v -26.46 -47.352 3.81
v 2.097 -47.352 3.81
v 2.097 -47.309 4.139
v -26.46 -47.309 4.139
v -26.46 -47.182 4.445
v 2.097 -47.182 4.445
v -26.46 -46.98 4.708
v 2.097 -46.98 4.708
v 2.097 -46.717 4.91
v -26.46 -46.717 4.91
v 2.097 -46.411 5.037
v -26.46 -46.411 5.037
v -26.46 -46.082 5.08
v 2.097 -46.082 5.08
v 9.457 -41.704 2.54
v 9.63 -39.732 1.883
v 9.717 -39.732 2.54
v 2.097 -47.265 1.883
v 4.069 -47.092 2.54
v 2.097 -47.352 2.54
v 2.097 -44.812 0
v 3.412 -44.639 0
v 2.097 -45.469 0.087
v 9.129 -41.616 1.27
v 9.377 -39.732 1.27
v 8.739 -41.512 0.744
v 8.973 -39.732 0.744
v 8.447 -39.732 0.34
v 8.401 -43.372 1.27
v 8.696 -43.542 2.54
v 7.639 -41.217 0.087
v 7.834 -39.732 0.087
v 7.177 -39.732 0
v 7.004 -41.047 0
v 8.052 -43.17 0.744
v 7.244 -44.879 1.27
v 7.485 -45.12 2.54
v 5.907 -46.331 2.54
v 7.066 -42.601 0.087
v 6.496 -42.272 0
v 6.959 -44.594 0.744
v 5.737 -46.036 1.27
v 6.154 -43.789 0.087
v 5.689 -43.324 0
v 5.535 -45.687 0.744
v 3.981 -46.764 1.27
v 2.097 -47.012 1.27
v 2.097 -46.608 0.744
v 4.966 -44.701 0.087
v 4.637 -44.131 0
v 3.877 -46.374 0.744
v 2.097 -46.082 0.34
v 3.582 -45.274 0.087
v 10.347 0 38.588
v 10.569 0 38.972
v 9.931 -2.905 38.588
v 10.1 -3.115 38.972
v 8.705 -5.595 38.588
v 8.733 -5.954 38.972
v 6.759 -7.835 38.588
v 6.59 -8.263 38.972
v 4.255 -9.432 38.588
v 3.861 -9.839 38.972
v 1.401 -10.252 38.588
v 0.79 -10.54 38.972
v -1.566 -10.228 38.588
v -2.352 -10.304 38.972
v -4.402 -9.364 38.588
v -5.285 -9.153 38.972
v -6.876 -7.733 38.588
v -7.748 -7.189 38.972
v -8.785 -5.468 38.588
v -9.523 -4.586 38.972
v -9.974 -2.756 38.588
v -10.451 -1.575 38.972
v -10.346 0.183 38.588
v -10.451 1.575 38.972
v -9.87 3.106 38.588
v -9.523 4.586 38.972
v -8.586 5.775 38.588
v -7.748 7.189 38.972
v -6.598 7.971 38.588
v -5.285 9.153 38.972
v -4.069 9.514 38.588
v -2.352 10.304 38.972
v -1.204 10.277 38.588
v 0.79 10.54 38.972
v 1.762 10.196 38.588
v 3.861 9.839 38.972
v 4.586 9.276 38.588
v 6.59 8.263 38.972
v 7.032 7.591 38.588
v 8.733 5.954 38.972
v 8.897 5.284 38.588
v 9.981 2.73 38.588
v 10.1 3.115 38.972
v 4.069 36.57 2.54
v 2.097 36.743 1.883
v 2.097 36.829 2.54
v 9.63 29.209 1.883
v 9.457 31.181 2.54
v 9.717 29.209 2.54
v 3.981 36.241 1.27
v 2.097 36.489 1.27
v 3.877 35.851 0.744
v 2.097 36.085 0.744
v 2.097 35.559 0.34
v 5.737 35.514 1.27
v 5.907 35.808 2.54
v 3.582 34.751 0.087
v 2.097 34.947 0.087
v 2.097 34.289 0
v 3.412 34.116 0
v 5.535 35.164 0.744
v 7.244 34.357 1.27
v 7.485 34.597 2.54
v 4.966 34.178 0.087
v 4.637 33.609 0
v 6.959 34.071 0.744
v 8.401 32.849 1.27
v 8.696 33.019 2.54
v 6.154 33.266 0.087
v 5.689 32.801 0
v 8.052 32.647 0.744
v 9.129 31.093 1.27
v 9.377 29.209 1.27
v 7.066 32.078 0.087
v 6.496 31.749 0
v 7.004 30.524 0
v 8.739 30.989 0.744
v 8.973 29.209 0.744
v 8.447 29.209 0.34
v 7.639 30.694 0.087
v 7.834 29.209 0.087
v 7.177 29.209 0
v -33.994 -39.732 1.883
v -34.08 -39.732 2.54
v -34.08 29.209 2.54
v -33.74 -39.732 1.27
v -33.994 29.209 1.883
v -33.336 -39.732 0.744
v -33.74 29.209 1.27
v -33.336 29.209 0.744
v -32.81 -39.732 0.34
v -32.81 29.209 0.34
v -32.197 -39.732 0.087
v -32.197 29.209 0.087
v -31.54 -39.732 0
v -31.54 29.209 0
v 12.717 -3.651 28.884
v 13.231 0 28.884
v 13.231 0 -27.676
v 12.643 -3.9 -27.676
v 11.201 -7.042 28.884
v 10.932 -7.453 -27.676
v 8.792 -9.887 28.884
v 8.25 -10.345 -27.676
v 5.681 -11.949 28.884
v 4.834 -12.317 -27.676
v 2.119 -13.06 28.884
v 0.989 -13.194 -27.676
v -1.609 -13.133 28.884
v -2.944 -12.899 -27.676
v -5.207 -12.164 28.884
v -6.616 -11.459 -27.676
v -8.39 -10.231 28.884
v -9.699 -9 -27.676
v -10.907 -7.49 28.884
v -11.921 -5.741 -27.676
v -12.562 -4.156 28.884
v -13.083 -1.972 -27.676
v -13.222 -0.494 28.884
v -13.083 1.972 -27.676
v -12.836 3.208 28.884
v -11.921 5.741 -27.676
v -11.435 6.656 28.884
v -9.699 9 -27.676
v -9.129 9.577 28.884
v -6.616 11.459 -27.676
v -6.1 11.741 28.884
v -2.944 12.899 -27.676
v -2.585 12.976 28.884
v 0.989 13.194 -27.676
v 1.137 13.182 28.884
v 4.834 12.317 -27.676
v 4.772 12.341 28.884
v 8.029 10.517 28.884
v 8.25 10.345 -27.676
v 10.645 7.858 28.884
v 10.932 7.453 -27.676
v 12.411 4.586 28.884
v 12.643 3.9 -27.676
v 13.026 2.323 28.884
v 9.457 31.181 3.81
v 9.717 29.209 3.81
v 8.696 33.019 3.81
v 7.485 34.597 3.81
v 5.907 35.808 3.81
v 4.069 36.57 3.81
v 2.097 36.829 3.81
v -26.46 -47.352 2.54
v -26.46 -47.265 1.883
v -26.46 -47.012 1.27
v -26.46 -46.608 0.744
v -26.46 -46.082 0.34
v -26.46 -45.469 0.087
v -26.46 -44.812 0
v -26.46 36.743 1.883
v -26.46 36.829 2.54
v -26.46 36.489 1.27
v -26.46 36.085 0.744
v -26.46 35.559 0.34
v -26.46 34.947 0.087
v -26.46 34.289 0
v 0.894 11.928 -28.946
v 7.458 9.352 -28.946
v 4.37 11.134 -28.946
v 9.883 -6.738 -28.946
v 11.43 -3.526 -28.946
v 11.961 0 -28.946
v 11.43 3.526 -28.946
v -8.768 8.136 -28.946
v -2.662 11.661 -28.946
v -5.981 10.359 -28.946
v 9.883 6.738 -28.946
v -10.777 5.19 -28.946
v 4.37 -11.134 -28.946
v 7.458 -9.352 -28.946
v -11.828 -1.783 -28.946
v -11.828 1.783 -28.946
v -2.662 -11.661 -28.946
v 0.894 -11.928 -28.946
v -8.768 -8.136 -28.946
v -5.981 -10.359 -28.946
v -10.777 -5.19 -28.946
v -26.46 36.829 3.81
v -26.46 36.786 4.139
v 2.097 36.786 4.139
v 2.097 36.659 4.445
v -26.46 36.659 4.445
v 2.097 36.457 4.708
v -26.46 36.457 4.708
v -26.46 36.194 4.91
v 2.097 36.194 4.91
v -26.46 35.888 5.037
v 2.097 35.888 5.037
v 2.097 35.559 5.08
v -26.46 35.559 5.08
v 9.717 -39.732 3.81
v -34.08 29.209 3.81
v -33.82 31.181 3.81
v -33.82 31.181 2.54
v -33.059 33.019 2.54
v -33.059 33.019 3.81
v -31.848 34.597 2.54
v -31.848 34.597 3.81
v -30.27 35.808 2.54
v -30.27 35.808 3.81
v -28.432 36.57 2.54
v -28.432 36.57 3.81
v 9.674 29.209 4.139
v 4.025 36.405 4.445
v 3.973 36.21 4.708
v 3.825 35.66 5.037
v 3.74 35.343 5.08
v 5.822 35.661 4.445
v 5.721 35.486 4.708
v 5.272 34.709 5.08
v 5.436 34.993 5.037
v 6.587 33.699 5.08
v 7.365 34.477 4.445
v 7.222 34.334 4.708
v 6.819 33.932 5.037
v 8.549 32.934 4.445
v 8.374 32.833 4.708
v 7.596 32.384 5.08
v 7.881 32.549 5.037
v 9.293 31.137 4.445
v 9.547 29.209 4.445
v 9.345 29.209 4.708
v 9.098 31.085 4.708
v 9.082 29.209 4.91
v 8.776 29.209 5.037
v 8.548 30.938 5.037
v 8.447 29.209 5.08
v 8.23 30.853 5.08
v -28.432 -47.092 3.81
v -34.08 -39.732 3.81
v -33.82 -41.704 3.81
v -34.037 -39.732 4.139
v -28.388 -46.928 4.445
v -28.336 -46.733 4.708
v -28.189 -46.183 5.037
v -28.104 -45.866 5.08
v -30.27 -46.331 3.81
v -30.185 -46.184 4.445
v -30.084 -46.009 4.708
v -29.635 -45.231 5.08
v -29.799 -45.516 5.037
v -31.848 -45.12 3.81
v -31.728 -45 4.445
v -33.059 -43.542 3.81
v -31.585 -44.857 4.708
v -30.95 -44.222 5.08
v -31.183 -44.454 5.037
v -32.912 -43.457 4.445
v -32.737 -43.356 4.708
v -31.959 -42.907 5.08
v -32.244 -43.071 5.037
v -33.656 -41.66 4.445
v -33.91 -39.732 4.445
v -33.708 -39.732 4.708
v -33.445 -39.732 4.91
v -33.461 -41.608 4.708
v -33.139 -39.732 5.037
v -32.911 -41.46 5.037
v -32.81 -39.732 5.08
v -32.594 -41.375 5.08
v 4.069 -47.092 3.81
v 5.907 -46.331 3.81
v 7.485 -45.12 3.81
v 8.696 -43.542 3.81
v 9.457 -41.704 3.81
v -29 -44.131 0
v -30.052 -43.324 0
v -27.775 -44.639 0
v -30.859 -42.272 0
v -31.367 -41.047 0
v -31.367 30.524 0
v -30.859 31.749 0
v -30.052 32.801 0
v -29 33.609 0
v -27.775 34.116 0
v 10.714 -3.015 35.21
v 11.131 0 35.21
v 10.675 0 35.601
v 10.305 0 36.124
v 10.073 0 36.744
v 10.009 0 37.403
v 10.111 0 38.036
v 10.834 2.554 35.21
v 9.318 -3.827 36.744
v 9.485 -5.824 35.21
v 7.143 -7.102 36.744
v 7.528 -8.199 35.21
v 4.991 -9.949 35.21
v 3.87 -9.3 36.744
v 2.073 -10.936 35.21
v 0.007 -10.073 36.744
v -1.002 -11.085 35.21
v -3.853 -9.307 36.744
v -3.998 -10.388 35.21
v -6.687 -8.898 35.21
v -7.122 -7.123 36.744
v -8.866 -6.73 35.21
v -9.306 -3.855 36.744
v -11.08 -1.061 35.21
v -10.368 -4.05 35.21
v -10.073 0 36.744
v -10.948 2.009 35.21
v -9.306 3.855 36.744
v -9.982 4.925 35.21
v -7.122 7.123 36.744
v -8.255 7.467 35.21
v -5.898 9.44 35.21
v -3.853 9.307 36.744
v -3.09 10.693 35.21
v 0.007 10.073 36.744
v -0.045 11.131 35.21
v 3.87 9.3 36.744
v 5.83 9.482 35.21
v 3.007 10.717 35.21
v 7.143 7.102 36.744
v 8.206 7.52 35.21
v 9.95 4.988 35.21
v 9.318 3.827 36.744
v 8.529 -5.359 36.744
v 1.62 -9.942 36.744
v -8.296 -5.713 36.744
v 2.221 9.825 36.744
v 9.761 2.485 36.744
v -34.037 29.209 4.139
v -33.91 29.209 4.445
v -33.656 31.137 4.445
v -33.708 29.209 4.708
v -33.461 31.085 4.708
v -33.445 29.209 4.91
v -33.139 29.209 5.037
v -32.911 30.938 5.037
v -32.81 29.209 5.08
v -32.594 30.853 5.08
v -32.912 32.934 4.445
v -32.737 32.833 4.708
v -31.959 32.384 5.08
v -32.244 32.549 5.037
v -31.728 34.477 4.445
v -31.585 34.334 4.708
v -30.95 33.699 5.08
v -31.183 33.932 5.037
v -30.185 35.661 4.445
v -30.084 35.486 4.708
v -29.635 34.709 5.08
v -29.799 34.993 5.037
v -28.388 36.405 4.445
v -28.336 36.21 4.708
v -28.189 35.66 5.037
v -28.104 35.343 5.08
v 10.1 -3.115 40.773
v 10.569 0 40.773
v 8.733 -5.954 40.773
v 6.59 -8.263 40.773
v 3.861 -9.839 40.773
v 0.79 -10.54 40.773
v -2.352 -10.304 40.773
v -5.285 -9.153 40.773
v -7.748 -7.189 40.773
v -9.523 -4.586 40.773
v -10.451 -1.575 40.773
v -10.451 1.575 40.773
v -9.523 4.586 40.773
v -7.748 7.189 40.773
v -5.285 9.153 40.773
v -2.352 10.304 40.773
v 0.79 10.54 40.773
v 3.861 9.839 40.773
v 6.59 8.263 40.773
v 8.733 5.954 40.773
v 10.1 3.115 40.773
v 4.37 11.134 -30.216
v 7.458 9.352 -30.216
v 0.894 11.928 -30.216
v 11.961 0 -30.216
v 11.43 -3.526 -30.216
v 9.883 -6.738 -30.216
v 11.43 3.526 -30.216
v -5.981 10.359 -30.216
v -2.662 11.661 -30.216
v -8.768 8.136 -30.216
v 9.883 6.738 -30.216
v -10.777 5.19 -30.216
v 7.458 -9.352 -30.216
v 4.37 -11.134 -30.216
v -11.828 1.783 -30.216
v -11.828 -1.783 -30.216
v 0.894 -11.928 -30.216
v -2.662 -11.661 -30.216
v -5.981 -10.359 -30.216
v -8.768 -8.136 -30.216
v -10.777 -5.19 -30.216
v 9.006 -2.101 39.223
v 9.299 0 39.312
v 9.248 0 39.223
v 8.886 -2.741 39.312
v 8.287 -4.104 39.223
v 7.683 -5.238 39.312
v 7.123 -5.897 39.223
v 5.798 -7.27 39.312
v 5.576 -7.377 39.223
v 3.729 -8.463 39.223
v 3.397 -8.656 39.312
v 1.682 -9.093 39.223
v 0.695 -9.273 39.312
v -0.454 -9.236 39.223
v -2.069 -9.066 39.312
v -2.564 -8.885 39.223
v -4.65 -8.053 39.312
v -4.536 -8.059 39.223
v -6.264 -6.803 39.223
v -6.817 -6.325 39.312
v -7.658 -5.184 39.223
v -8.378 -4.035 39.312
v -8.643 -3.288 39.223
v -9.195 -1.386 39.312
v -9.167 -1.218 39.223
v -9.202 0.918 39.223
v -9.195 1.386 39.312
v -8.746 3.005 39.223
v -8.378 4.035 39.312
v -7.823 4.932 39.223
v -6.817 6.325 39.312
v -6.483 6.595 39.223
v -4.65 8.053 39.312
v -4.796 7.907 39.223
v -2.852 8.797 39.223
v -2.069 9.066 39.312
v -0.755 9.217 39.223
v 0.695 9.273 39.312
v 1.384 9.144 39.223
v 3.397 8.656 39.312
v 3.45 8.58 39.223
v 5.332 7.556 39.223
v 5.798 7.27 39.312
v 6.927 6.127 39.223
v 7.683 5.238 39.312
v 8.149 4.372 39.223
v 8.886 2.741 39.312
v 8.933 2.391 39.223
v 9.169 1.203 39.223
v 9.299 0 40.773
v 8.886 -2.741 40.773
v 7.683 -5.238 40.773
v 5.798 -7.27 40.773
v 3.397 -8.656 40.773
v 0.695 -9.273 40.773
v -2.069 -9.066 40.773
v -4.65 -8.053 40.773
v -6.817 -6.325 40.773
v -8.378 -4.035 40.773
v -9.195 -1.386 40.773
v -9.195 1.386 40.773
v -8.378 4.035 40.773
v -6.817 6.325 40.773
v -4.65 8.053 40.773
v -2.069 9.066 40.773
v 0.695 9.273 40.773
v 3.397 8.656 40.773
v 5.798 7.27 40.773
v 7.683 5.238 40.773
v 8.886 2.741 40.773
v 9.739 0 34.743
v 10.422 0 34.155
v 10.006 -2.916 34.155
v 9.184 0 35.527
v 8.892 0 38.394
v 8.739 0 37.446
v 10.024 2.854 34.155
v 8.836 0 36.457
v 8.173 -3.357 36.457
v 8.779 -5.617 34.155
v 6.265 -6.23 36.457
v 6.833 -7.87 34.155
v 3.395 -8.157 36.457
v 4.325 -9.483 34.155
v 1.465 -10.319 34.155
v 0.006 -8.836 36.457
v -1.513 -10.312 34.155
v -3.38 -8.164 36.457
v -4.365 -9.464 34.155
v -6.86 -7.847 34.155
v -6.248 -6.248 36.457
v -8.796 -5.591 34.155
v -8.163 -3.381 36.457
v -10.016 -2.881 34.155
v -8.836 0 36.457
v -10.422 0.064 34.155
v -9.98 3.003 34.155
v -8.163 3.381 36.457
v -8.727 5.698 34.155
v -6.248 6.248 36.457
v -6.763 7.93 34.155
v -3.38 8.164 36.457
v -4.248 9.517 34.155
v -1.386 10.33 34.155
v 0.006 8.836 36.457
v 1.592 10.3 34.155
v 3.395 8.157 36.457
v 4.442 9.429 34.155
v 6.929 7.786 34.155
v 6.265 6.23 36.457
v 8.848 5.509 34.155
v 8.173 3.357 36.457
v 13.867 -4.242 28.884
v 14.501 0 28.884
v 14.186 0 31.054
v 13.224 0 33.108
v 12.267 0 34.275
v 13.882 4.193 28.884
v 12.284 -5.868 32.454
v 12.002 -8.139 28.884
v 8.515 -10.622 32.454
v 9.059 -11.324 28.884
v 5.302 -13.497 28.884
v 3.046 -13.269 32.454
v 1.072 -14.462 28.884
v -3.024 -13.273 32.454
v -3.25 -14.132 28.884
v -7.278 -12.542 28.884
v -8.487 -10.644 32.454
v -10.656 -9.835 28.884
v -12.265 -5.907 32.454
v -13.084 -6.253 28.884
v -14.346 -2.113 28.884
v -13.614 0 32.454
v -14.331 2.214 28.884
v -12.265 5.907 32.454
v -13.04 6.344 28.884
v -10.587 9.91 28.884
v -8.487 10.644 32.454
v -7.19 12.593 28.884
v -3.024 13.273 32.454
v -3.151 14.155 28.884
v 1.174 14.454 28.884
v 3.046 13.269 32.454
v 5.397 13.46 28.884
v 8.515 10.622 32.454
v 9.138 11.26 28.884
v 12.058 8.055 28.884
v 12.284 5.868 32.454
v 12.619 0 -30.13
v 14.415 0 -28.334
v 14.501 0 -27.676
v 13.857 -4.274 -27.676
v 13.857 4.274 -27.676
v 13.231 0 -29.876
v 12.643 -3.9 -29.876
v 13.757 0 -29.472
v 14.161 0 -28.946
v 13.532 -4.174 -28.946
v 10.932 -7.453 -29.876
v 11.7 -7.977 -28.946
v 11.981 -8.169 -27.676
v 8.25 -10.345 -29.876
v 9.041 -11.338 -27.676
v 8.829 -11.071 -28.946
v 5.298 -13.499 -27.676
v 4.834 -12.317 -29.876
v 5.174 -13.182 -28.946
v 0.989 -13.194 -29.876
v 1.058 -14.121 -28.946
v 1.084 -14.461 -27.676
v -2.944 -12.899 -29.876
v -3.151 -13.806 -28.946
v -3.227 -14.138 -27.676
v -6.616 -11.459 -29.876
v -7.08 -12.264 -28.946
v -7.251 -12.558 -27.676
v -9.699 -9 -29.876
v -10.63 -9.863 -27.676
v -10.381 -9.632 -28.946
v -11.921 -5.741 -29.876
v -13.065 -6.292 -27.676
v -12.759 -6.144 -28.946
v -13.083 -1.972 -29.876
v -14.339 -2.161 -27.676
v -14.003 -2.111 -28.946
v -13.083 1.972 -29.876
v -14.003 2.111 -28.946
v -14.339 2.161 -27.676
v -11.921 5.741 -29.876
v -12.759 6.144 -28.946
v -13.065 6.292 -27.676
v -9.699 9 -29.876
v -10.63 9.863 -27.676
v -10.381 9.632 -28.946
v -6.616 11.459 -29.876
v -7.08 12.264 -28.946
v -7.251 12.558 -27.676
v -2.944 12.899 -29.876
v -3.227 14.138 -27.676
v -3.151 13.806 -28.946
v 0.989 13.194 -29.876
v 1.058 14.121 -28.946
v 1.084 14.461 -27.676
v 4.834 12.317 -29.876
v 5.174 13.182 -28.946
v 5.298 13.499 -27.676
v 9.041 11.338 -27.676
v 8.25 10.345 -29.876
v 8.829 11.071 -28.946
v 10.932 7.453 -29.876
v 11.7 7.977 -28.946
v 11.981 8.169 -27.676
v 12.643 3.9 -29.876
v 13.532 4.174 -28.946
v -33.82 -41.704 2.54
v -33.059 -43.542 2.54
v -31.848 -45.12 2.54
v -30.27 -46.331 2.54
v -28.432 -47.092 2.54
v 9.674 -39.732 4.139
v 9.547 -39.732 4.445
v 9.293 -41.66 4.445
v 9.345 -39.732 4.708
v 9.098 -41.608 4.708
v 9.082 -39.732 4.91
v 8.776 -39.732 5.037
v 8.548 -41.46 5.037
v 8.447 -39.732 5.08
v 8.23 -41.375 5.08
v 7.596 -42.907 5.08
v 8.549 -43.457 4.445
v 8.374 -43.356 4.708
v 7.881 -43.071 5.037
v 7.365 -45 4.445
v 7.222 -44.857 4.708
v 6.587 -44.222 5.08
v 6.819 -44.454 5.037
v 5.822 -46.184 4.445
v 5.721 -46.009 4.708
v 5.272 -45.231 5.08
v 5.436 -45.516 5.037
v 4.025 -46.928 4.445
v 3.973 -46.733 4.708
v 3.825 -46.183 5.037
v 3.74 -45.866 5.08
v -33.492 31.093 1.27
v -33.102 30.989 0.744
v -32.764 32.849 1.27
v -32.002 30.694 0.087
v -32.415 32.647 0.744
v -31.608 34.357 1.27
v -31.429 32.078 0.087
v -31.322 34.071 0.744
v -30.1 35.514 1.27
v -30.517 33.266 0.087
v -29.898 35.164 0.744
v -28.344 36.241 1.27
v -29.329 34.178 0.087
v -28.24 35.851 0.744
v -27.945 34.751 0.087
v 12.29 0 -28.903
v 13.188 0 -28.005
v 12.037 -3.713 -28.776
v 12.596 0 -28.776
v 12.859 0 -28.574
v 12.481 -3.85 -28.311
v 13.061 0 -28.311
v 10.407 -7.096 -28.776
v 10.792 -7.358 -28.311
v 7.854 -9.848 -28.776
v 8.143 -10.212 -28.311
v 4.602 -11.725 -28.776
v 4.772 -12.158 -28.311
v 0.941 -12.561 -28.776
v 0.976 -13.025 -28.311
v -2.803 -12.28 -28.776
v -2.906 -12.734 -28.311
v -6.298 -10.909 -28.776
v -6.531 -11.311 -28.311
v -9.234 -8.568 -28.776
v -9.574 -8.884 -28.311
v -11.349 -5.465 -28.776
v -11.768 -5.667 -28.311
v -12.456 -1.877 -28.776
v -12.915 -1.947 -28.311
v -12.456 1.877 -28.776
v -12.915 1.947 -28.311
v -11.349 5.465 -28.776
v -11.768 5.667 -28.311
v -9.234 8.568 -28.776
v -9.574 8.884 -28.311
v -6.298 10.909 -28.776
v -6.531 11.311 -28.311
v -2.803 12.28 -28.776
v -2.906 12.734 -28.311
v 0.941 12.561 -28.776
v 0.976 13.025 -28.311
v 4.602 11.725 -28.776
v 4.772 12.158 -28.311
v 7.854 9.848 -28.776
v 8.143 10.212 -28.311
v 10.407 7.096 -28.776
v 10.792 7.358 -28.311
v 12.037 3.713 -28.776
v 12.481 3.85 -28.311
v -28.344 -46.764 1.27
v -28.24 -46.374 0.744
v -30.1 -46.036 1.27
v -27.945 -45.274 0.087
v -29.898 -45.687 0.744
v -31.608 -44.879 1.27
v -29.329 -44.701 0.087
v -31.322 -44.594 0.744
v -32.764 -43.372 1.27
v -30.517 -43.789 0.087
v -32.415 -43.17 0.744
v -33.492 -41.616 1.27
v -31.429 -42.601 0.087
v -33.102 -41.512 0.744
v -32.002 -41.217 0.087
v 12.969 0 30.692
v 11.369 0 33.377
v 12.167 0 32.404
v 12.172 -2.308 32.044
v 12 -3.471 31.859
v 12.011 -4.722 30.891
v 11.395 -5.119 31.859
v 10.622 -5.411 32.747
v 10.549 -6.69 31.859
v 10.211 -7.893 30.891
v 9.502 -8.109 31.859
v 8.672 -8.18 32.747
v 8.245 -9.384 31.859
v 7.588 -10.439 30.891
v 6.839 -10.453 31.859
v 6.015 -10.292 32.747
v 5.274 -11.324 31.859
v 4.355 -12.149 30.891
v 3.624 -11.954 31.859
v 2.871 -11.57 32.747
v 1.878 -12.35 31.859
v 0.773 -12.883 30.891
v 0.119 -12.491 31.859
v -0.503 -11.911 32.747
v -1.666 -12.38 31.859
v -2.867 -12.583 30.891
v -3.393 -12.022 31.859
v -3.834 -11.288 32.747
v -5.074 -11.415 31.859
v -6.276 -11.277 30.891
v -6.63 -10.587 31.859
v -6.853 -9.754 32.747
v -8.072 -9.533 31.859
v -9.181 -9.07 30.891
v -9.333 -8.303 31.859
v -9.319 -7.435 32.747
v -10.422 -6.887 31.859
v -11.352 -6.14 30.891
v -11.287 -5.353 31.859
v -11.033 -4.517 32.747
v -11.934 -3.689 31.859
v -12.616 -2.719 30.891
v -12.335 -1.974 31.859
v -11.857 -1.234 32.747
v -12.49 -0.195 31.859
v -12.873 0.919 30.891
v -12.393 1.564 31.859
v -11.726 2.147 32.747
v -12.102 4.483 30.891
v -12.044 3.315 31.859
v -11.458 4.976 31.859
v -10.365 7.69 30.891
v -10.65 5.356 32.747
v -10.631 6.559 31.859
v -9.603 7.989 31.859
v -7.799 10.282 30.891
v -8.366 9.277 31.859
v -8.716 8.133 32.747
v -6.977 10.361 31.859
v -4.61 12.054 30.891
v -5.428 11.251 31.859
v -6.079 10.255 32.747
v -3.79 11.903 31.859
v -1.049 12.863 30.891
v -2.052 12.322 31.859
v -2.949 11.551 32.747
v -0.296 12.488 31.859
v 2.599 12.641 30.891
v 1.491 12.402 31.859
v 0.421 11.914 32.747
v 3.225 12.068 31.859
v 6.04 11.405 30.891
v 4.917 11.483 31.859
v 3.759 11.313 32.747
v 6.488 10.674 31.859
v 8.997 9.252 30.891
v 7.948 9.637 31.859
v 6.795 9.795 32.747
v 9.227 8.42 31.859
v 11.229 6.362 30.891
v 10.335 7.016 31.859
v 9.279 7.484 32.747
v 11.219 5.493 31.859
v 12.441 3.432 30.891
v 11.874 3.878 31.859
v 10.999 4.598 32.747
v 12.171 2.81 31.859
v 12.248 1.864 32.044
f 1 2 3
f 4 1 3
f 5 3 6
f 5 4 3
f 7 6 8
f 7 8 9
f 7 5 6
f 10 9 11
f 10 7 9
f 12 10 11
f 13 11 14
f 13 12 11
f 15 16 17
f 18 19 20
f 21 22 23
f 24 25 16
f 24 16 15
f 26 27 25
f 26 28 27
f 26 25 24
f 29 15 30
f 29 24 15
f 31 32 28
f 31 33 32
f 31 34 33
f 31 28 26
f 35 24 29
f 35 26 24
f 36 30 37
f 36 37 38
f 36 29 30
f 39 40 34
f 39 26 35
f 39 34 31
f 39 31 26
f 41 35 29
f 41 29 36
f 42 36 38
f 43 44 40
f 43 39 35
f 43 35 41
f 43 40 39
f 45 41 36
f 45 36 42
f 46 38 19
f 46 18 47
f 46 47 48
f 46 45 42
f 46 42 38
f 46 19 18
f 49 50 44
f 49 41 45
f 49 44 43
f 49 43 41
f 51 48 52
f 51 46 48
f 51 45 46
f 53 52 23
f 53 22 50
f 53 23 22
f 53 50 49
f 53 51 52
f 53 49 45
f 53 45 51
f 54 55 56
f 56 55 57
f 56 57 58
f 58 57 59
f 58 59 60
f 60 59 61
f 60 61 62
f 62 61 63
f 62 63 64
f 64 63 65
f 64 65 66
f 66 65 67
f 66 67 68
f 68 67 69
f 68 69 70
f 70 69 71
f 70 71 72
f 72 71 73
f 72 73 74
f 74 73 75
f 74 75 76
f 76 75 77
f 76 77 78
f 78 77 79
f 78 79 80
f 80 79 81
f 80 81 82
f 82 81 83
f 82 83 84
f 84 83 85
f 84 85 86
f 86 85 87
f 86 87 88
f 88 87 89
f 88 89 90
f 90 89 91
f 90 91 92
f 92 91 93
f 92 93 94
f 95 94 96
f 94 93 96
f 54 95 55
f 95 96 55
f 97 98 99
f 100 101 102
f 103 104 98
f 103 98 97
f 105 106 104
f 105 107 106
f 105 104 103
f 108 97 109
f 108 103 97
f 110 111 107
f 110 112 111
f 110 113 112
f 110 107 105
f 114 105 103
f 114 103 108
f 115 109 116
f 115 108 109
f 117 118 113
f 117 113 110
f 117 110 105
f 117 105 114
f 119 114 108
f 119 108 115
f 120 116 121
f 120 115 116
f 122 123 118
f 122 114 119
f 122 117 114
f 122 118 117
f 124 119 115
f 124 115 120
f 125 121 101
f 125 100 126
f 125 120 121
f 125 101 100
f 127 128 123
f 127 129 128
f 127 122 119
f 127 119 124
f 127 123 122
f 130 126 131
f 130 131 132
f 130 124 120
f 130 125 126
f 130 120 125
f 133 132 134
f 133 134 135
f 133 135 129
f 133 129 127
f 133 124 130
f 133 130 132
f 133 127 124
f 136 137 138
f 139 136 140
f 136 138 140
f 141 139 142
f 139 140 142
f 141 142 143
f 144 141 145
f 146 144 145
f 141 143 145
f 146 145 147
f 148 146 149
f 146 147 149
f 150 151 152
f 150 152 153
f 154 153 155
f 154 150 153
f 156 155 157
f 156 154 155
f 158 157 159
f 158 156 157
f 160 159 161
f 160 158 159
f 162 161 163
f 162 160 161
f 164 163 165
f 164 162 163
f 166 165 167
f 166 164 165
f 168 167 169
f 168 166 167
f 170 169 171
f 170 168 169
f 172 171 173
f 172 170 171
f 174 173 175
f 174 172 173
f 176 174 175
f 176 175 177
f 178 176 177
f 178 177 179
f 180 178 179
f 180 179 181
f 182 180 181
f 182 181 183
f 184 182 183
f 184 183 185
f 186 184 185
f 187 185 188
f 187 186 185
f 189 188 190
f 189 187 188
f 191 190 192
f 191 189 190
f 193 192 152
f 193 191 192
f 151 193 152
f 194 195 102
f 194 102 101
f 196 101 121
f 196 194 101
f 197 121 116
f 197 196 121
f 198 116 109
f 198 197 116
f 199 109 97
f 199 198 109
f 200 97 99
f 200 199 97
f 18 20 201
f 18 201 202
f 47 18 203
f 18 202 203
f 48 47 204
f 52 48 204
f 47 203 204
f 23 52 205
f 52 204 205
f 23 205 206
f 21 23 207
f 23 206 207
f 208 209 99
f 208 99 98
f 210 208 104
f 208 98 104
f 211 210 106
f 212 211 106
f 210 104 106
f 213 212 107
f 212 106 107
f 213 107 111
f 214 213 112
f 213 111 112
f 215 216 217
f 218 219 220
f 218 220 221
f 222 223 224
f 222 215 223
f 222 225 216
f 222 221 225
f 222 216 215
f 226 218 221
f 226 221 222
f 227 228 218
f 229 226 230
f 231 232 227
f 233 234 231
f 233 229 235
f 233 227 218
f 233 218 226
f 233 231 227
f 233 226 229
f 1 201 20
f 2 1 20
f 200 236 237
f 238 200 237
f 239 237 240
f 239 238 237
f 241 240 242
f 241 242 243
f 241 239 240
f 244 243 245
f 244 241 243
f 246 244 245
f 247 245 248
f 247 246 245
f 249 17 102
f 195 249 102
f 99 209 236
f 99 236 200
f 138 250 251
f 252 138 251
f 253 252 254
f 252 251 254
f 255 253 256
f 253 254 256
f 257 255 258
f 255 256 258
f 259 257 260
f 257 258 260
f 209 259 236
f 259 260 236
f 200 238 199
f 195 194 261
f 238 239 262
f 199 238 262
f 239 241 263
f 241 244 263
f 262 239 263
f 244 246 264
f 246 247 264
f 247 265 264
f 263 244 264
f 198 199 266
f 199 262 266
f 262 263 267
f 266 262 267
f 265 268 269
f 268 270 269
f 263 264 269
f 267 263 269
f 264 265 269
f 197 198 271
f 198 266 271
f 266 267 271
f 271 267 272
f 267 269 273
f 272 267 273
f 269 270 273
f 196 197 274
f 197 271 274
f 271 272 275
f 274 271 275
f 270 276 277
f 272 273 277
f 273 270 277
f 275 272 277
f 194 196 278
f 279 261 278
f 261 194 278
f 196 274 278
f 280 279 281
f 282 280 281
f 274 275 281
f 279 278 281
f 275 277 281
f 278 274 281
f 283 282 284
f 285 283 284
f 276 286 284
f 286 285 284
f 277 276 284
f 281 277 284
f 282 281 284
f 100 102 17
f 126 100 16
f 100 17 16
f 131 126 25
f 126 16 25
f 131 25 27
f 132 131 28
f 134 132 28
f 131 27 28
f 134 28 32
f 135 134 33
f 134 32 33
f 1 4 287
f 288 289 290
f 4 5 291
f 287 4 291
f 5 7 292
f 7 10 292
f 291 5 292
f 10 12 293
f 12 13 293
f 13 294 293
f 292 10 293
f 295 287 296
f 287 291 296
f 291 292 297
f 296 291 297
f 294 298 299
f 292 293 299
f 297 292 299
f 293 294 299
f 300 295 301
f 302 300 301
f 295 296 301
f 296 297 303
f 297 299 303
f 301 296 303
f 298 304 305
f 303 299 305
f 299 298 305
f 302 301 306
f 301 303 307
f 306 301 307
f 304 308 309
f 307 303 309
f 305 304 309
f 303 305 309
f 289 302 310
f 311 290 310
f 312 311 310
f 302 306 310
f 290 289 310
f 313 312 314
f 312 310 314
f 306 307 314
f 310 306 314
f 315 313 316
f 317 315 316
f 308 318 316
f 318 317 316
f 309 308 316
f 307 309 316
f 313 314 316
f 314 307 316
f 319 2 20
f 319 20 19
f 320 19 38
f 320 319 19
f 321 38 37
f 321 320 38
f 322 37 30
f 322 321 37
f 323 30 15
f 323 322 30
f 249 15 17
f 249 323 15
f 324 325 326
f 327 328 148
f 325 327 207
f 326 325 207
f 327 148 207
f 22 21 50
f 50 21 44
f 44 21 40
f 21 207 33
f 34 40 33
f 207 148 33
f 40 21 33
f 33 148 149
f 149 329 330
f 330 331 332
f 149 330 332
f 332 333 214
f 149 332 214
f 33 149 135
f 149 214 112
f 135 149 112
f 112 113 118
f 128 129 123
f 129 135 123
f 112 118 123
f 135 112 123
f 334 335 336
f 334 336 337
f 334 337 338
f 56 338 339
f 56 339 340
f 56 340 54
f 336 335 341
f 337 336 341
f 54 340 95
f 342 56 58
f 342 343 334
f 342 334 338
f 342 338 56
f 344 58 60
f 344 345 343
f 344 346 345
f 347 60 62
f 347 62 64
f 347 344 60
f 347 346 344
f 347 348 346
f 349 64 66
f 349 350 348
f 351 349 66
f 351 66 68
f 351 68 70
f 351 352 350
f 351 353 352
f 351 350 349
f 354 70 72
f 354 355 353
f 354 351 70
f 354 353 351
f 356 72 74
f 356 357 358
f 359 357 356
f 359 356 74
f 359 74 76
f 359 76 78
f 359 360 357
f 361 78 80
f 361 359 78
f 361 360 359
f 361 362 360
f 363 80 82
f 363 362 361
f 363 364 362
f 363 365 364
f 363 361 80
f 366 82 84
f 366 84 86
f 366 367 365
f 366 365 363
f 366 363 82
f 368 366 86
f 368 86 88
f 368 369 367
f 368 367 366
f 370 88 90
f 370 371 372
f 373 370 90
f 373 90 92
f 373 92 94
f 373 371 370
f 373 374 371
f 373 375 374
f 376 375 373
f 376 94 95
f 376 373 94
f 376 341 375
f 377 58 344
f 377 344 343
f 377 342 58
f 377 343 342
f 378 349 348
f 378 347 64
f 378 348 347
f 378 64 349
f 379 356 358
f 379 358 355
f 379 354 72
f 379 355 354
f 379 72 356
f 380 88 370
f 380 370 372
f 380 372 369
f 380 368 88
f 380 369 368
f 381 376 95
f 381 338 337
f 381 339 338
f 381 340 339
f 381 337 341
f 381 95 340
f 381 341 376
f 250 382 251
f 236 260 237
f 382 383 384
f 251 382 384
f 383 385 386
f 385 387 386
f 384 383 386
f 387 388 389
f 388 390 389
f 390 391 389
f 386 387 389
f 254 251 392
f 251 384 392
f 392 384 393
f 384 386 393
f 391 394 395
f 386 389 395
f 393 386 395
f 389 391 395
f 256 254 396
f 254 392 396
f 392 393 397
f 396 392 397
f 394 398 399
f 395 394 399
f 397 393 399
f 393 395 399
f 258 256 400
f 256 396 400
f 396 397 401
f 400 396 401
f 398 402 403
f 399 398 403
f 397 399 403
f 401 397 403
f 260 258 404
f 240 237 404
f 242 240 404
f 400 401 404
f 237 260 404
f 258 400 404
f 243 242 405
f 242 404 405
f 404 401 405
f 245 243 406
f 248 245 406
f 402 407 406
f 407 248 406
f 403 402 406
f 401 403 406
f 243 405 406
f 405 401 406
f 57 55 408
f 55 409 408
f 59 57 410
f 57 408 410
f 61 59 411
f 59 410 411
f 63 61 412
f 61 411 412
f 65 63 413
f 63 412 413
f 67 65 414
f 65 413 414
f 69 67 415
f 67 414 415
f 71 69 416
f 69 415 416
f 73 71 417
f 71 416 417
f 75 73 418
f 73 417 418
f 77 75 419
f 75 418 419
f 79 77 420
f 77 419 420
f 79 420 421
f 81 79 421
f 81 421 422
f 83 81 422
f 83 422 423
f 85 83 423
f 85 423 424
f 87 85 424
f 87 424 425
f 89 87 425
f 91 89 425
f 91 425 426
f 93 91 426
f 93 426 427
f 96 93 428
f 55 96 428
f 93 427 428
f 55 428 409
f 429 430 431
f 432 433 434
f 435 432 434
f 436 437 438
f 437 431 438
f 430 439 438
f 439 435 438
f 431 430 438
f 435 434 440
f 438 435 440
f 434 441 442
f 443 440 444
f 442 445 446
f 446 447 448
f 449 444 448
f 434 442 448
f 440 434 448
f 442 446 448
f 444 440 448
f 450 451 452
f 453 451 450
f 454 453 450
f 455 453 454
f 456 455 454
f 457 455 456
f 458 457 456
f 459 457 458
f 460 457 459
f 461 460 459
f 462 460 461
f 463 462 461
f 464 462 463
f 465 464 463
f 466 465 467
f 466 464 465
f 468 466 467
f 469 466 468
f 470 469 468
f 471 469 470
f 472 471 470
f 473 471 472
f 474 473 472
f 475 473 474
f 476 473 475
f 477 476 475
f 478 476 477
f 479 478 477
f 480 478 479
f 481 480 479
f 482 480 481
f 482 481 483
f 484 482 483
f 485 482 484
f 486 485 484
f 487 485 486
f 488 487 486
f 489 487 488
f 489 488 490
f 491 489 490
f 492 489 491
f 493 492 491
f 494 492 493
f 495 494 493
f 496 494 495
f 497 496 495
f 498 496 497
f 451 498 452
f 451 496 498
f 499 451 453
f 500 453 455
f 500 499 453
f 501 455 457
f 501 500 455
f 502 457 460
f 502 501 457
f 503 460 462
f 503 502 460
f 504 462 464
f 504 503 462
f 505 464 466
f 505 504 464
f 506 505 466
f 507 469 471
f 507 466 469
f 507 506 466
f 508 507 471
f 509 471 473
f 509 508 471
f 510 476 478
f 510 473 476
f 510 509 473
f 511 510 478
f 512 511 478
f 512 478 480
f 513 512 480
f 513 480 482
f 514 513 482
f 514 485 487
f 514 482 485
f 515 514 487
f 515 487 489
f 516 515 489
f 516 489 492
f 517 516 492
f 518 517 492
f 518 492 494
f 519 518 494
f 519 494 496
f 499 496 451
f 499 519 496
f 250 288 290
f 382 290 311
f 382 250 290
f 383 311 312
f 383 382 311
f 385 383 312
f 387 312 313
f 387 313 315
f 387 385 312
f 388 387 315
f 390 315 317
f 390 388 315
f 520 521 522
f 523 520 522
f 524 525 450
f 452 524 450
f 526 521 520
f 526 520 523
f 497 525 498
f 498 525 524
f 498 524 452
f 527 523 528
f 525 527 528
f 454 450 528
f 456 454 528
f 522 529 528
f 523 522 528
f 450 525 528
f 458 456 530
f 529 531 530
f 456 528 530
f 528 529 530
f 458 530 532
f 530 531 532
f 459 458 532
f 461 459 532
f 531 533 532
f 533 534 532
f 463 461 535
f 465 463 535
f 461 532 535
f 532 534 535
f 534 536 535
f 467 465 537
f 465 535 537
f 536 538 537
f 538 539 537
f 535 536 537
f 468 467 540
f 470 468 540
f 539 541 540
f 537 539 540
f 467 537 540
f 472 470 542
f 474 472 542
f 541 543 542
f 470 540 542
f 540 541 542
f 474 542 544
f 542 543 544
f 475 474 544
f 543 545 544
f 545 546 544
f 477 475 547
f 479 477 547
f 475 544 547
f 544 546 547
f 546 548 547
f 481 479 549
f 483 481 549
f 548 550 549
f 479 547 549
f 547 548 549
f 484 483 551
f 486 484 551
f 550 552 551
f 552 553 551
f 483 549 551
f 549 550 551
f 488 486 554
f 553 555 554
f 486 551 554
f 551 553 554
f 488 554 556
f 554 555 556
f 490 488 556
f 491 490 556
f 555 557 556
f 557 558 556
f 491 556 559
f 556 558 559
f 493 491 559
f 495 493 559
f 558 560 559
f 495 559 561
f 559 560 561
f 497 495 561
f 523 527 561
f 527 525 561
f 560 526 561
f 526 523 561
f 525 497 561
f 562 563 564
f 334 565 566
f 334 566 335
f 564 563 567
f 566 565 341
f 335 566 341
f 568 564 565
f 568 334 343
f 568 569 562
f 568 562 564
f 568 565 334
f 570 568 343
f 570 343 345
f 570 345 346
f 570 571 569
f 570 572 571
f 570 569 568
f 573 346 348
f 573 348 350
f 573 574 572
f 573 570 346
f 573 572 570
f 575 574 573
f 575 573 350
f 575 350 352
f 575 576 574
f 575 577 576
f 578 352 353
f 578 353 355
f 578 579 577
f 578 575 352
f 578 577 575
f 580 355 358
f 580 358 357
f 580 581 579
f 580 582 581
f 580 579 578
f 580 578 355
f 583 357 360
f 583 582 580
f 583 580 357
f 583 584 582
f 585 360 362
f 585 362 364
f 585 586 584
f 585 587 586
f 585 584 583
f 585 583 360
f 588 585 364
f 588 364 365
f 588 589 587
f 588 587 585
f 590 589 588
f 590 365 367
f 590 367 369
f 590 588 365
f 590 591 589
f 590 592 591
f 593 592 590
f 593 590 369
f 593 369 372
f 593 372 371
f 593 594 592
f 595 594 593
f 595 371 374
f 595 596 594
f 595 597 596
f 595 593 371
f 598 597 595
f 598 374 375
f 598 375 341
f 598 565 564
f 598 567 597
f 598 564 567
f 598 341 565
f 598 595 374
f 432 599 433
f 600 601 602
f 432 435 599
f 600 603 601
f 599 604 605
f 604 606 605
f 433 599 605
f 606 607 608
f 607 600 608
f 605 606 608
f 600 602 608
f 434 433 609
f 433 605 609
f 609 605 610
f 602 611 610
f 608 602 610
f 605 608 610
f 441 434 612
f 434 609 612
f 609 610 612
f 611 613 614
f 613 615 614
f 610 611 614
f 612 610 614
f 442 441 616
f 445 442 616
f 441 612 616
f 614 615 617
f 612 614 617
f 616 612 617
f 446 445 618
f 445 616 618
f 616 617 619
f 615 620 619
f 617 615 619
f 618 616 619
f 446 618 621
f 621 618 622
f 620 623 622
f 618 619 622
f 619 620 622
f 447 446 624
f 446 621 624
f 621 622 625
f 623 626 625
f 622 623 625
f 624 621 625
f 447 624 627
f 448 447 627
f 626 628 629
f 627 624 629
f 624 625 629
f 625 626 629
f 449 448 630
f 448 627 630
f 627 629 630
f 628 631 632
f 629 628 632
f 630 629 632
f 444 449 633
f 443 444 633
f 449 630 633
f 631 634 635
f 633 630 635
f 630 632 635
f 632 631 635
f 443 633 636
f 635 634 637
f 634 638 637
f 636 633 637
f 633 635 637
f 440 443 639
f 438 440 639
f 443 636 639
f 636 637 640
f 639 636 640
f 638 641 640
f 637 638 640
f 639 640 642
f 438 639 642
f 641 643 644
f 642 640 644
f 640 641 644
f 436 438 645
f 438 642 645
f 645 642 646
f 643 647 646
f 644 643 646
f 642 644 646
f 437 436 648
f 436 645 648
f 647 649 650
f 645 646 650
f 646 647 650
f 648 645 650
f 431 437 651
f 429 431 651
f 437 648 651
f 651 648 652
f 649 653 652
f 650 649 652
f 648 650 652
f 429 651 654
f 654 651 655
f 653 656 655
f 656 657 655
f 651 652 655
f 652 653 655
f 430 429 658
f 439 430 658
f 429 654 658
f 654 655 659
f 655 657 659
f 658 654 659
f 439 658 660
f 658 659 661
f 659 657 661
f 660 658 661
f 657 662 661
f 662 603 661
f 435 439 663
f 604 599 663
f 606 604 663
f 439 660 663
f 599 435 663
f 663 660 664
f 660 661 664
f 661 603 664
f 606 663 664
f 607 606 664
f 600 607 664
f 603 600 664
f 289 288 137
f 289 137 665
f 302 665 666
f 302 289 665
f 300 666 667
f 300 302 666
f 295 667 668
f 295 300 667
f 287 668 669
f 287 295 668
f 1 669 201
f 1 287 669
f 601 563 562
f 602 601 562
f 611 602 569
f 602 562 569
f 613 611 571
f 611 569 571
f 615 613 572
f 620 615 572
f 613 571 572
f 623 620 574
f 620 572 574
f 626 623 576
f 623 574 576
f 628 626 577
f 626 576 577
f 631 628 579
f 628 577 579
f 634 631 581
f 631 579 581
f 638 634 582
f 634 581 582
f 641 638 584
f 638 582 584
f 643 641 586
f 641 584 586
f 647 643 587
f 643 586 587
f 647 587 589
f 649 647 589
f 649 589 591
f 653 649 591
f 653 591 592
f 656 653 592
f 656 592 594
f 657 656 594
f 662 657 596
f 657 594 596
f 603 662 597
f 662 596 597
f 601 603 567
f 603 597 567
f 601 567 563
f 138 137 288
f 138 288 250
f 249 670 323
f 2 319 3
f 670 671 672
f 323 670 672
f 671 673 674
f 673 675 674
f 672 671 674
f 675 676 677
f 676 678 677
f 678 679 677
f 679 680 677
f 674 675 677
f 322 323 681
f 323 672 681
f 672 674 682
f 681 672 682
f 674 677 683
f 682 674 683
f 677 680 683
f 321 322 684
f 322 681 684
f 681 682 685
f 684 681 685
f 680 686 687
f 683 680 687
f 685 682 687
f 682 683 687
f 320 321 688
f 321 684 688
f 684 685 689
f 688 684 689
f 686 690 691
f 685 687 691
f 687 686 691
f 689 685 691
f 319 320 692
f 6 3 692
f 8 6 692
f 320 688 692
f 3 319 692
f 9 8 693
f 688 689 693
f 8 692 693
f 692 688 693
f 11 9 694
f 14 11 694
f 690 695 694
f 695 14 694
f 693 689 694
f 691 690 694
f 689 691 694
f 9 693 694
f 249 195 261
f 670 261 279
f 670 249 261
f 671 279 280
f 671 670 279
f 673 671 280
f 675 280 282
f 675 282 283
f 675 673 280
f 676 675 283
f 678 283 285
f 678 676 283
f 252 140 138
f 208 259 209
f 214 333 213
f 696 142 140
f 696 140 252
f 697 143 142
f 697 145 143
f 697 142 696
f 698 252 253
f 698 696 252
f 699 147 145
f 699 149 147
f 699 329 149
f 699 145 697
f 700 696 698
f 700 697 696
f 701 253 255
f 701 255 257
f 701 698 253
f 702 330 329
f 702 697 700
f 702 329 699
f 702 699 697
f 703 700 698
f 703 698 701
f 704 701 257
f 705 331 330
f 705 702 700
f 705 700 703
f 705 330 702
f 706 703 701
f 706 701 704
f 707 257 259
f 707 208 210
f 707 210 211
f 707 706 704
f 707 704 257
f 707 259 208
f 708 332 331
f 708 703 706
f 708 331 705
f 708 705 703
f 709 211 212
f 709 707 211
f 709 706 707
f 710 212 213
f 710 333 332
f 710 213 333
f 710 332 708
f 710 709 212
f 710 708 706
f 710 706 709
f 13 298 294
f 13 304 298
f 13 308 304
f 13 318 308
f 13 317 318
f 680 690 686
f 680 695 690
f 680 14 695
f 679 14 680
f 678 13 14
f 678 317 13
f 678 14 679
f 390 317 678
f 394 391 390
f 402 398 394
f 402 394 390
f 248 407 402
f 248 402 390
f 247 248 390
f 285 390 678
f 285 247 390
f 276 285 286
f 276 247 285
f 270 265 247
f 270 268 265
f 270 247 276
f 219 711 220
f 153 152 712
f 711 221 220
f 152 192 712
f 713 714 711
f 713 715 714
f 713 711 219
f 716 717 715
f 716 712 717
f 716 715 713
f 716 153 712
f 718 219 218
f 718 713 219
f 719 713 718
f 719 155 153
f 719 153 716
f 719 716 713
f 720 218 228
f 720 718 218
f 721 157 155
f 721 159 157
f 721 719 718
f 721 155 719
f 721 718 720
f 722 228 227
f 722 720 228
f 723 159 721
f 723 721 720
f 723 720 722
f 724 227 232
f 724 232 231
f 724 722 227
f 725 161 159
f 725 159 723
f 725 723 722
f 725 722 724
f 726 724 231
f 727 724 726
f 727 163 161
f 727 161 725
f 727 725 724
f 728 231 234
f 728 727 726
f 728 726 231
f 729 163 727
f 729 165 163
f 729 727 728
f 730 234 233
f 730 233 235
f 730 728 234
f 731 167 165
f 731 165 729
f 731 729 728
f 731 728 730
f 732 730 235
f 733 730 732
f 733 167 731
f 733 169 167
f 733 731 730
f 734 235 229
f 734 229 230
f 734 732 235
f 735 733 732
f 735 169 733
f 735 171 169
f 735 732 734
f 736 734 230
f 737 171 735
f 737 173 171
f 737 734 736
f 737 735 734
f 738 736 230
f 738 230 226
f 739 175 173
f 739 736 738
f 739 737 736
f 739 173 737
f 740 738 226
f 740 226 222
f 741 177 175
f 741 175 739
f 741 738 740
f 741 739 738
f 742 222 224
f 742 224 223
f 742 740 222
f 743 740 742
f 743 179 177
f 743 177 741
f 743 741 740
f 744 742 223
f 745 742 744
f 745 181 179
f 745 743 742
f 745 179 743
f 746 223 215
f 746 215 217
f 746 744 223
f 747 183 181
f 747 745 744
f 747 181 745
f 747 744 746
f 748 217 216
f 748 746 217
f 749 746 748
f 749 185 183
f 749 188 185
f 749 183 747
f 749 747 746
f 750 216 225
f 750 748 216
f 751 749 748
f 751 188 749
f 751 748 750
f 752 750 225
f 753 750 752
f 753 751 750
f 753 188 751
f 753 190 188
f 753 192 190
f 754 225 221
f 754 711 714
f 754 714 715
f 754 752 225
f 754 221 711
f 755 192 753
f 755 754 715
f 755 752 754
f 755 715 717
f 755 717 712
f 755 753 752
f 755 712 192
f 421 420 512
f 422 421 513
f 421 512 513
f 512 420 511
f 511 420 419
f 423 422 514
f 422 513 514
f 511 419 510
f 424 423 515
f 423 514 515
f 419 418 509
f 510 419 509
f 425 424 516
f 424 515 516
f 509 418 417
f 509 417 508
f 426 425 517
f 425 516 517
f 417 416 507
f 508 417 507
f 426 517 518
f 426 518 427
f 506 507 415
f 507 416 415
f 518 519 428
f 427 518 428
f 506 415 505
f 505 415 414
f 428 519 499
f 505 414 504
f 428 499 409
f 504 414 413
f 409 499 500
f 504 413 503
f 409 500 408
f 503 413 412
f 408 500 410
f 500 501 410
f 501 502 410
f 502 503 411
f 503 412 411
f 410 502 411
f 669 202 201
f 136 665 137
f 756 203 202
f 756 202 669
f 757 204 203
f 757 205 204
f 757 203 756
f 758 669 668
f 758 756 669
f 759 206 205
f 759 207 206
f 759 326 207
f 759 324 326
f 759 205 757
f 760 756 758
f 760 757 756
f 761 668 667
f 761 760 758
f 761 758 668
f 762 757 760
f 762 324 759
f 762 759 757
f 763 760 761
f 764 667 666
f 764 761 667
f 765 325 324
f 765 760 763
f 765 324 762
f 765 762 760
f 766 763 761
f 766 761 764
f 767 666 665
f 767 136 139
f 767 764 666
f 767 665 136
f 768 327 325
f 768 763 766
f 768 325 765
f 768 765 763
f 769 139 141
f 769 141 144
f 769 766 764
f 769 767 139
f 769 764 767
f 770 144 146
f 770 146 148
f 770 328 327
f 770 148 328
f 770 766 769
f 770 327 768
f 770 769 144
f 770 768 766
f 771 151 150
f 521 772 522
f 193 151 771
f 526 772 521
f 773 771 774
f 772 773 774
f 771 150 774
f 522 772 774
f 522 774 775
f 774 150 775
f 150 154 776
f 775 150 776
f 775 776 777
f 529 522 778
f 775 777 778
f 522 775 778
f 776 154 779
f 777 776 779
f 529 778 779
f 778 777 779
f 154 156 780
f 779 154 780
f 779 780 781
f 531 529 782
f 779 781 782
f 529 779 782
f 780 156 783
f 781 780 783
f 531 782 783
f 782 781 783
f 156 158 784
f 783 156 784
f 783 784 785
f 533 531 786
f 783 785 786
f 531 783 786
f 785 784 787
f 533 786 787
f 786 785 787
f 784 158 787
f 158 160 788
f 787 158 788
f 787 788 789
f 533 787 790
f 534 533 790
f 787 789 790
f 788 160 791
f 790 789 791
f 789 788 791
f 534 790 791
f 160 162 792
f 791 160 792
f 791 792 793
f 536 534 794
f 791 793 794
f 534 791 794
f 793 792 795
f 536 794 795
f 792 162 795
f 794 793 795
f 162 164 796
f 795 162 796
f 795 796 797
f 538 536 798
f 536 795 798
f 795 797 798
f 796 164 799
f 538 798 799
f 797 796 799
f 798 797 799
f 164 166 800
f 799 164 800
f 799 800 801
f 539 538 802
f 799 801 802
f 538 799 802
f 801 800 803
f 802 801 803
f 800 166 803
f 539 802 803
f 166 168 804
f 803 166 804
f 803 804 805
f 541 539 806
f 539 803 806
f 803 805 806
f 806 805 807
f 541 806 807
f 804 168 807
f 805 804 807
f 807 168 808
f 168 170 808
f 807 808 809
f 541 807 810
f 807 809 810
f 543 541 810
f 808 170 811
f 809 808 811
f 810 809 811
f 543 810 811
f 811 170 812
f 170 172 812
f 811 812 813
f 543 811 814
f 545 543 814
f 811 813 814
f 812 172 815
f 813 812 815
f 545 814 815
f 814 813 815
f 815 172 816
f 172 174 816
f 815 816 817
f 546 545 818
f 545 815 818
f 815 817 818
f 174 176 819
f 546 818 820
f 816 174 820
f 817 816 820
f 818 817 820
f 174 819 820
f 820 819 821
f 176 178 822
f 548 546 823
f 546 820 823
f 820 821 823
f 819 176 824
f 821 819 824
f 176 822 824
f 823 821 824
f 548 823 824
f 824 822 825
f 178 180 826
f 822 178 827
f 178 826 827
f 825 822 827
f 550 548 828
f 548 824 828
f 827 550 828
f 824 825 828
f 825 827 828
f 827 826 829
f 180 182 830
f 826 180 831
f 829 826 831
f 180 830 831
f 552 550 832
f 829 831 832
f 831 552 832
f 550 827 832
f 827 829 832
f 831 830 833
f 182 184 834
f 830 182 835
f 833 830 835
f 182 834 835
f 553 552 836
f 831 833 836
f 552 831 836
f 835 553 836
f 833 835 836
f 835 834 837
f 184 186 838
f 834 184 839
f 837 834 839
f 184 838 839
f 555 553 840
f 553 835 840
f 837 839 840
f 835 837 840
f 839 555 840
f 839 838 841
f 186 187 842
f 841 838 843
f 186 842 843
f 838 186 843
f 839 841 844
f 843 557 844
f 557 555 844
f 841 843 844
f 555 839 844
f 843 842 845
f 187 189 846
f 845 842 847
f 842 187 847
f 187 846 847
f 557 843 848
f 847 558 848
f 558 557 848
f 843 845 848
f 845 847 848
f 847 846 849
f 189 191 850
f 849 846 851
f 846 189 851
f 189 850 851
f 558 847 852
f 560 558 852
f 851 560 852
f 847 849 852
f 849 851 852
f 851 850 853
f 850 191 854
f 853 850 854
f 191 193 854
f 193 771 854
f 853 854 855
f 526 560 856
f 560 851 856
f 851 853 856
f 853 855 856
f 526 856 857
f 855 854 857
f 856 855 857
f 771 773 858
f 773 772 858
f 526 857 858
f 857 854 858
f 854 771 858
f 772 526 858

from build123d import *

# Parameters (mm, degrees)
F0_W     = 43.796943
F0_H     = 84.181137
F1_DEPTH = 5.08
F2_R     = 7.62
F3_R     = 2.54
F4_R     = 1.27
F7_R     = 2.54
F8_R     = 7.62
F9_R     = 2.54
F10_T    = -1.27


with BuildPart() as f1:
    # F0 (on Top) → F1 (new body)
    with BuildSketch(Plane.XY):
        with Locations((-12.181616, -5.261321)):
            Rectangle(F0_W, F0_H)
    extrude(amount=F1_DEPTH)

    # F2
    f2_edges = [f1.edges().sort_by_distance(p)[0] for p in [
        (-34.080088, -47.351889, 2.54),
        (9.716855, -47.351889, 2.54),
        (9.716855, 36.829248, 2.54),
        (-34.080088, 36.829248, 2.54),
    ]]
    fillet(f2_edges, radius=F2_R)

    # F3
    f3_edges = [f1.edges().sort_by_distance(p)[0] for p in [
        (-34.080088, -5.261321, 0),
    ]]
    fillet(f3_edges, radius=F3_R)

    # F4
    f4_edges = [f1.edges().sort_by_distance(p)[0] for p in [
        (-34.080088, -5.261321, 5.08),
    ]]
    fillet(f4_edges, radius=F4_R)


with BuildPart() as f6:
    # F5 (on Front) → F6 (revolve)
    with BuildSketch(Plane.XZ):
        Polygon((0, 32.432933), (0, -30.216118), (14.501221, -30.216118), (14.501221, 33.283882), (9.089231, 36.408496), (10.569267, 38.971994), (10.569267, 40.772511), (0, 40.772511), align=None)
    revolve(axis=Axis((0, 0, 1.108407), (0, 0, -1)))

    # F7
    f7_edges = [f6.edges().sort_by_distance(p)[0] for p in [
        (-14.501221, 0, -30.216118),
    ]]
    fillet(f7_edges, radius=F7_R)

    # F8
    f8_edges = [f6.edges().sort_by_distance(p)[0] for p in [
        (-14.501221, 0, 33.283882),
    ]]
    fillet(f8_edges, radius=F8_R)

    # F9
    f9_edges = [f6.edges().sort_by_distance(p)[0] for p in [
        (-9.089231, 0, 36.408496),
    ]]
    fillet(f9_edges, radius=F9_R)

    # F10
    f10_openings = [f6.faces().sort_by_distance(p)[0] for p in [
        (0, 0, 40.772511),
    ]]
    offset(amount=F10_T, openings=f10_openings)


solid = Compound([f1.part, f6.part])
